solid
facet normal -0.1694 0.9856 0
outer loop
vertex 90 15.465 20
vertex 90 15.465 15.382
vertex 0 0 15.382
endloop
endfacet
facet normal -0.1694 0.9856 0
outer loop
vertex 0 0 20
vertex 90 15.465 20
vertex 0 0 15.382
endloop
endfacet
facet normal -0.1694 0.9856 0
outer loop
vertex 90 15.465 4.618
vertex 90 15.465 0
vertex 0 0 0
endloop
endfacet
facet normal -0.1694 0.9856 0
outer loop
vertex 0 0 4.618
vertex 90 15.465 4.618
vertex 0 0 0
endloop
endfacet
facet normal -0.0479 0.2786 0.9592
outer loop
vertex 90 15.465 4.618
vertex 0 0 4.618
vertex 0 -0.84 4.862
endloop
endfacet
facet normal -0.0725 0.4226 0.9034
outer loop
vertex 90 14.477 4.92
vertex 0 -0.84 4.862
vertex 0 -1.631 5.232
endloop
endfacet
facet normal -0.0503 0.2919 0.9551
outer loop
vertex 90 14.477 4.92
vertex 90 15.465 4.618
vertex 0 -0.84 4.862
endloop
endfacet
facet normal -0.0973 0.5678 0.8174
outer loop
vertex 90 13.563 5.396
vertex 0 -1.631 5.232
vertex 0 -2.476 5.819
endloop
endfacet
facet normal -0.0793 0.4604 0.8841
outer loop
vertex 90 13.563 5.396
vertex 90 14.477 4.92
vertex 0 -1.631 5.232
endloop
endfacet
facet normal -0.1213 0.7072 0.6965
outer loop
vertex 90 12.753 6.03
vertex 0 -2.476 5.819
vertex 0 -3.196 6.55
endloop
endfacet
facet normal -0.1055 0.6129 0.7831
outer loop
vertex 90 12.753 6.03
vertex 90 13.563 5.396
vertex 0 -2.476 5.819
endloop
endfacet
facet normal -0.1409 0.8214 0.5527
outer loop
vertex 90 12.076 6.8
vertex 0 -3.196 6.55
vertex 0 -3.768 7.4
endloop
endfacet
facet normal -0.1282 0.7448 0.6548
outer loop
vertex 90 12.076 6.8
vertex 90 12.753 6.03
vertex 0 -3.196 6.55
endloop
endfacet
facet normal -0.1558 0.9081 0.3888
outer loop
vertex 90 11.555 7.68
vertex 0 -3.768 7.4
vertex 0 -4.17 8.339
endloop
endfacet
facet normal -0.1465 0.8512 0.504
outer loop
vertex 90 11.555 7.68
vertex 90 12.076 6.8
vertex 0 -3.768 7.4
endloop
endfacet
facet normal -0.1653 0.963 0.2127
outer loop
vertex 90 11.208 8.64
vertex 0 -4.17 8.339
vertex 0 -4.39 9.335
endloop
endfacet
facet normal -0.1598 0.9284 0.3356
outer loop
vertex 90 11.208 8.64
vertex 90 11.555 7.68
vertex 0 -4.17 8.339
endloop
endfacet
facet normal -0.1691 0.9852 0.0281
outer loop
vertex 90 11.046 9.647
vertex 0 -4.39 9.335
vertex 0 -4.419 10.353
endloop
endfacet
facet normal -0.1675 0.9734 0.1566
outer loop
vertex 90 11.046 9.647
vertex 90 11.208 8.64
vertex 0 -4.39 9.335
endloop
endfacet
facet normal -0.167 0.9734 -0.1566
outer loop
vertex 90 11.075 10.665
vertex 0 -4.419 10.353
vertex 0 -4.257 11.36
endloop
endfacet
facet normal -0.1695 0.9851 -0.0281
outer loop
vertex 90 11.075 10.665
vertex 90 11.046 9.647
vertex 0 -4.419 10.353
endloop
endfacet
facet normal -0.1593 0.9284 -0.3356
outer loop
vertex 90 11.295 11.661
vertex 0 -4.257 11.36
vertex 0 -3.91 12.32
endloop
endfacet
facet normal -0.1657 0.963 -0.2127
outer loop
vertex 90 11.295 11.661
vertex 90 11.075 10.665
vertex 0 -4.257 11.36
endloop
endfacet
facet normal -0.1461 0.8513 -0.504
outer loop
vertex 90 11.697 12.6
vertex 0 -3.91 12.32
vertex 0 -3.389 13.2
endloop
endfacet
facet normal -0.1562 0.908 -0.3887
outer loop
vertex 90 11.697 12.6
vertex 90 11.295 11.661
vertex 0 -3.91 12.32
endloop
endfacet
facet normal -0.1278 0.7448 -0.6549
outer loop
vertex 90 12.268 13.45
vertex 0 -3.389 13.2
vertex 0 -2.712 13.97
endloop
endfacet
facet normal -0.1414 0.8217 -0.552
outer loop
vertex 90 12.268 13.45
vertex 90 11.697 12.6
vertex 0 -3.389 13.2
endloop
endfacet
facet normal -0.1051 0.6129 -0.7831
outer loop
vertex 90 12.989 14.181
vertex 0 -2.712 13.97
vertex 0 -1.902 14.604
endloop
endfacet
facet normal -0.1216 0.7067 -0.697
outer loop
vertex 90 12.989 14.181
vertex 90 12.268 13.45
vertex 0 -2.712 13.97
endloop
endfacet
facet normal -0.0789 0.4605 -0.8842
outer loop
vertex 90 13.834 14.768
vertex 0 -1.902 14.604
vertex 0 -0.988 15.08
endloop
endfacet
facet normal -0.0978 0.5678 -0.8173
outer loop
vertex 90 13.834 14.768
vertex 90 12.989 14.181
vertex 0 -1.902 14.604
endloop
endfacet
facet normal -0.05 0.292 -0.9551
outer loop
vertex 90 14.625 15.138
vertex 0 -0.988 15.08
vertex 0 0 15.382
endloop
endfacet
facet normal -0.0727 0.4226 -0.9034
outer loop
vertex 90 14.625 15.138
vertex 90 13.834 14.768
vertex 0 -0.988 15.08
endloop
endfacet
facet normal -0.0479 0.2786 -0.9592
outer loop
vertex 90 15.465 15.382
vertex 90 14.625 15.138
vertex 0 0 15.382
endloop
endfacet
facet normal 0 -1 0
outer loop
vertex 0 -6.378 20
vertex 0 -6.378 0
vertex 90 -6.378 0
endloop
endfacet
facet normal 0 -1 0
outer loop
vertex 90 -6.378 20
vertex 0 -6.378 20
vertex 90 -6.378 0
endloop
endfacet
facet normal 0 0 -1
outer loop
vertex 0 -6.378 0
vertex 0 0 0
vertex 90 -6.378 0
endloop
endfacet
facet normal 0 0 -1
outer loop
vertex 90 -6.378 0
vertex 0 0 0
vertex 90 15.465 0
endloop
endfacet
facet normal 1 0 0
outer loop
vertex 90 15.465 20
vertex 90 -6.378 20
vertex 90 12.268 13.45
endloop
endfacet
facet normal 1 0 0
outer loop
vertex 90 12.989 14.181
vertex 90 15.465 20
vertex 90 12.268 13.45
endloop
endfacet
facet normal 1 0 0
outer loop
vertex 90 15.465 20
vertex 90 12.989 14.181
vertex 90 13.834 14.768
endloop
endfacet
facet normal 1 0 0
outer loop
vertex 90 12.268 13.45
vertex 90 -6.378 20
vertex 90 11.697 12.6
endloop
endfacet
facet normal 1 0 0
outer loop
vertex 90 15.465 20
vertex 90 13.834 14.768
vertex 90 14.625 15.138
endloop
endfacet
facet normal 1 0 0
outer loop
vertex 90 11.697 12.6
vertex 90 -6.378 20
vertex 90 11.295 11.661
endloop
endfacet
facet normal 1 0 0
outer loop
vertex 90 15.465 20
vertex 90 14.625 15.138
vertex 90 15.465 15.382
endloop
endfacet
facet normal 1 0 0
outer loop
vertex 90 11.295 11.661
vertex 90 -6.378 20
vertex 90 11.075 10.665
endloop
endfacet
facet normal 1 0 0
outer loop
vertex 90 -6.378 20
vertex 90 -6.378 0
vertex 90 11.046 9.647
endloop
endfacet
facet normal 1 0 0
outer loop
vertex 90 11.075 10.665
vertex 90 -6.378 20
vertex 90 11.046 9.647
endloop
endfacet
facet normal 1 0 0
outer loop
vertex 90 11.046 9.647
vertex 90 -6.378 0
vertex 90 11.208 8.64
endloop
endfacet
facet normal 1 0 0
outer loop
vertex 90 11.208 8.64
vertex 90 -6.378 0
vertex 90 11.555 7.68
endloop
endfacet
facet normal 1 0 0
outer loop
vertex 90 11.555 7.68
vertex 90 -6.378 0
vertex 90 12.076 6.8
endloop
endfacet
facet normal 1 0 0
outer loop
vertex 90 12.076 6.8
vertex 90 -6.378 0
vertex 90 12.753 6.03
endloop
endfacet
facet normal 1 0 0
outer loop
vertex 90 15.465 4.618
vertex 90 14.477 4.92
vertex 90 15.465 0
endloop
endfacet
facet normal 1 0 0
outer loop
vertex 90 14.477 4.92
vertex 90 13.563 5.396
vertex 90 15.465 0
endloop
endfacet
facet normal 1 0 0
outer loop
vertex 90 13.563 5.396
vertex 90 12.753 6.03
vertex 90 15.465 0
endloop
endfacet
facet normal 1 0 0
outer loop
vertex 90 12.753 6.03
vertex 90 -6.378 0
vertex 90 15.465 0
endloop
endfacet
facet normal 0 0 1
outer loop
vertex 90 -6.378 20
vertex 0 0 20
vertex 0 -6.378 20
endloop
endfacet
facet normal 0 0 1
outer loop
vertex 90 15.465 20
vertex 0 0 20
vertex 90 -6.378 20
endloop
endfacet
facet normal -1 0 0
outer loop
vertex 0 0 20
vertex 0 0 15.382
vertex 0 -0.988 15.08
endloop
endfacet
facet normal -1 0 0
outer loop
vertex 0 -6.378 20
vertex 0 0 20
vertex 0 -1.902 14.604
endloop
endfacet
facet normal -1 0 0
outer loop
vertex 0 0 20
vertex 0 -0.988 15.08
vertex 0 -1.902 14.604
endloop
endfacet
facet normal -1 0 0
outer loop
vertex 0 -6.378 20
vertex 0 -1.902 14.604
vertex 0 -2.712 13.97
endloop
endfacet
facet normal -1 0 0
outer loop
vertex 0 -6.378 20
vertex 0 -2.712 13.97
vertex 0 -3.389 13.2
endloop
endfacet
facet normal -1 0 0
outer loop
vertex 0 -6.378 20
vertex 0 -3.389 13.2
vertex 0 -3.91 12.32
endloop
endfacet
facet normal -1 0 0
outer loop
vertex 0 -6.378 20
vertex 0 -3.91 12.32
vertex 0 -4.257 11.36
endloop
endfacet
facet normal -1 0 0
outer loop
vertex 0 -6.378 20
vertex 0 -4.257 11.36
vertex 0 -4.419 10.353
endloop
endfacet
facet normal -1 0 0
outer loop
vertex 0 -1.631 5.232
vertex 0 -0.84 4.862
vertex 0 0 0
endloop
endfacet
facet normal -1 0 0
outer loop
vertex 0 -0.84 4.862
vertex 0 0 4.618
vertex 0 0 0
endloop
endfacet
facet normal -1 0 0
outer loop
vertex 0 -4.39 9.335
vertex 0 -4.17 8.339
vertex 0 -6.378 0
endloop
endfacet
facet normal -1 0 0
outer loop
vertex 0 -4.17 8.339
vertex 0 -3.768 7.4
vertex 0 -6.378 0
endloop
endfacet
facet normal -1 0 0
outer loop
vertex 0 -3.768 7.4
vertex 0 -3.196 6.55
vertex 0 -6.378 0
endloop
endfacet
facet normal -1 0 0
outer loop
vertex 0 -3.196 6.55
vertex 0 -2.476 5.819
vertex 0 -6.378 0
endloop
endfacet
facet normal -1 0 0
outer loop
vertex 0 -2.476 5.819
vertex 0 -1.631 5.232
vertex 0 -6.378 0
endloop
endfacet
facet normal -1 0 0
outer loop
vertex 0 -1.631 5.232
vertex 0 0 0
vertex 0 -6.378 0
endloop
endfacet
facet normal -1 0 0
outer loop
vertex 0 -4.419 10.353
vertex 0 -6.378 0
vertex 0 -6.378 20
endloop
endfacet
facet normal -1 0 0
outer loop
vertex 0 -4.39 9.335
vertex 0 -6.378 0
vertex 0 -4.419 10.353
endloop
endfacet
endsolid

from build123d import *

# Parameters (mm, degrees)
BOSS_EXTRUDE1_DEPTH = 20
CUT_EXTRUDE1_DEPTH  = 93.39919136


with BuildPart() as part:
    # Sketch2 → Boss-Extrude1 (new body)
    with BuildSketch(Plane.XY):
        Polygon((90, 0), (90, 15.464828415), (0, 0), (0, -6.378436315), (90, -6.378436315), align=None)
    extrude(amount=BOSS_EXTRUDE1_DEPTH)

    # Sketch5 → Cut-Extrude1 (cut, through all)
    with BuildSketch(Plane(origin=(90, 15.464828415, 0), x_dir=(0, 0, -1), z_dir=(0.985556059, 0.169349504, 0))):
        with BuildLine():
            Line((-15.381941787, 0), (-4.618058213, 0))
            ThreePointArc((-4.618058213, 0), (-10, -4.366552781), (-15.381941787, 0))
        make_face()
    extrude(amount=-CUT_EXTRUDE1_DEPTH, mode=Mode.SUBTRACT)


solid = part.part
